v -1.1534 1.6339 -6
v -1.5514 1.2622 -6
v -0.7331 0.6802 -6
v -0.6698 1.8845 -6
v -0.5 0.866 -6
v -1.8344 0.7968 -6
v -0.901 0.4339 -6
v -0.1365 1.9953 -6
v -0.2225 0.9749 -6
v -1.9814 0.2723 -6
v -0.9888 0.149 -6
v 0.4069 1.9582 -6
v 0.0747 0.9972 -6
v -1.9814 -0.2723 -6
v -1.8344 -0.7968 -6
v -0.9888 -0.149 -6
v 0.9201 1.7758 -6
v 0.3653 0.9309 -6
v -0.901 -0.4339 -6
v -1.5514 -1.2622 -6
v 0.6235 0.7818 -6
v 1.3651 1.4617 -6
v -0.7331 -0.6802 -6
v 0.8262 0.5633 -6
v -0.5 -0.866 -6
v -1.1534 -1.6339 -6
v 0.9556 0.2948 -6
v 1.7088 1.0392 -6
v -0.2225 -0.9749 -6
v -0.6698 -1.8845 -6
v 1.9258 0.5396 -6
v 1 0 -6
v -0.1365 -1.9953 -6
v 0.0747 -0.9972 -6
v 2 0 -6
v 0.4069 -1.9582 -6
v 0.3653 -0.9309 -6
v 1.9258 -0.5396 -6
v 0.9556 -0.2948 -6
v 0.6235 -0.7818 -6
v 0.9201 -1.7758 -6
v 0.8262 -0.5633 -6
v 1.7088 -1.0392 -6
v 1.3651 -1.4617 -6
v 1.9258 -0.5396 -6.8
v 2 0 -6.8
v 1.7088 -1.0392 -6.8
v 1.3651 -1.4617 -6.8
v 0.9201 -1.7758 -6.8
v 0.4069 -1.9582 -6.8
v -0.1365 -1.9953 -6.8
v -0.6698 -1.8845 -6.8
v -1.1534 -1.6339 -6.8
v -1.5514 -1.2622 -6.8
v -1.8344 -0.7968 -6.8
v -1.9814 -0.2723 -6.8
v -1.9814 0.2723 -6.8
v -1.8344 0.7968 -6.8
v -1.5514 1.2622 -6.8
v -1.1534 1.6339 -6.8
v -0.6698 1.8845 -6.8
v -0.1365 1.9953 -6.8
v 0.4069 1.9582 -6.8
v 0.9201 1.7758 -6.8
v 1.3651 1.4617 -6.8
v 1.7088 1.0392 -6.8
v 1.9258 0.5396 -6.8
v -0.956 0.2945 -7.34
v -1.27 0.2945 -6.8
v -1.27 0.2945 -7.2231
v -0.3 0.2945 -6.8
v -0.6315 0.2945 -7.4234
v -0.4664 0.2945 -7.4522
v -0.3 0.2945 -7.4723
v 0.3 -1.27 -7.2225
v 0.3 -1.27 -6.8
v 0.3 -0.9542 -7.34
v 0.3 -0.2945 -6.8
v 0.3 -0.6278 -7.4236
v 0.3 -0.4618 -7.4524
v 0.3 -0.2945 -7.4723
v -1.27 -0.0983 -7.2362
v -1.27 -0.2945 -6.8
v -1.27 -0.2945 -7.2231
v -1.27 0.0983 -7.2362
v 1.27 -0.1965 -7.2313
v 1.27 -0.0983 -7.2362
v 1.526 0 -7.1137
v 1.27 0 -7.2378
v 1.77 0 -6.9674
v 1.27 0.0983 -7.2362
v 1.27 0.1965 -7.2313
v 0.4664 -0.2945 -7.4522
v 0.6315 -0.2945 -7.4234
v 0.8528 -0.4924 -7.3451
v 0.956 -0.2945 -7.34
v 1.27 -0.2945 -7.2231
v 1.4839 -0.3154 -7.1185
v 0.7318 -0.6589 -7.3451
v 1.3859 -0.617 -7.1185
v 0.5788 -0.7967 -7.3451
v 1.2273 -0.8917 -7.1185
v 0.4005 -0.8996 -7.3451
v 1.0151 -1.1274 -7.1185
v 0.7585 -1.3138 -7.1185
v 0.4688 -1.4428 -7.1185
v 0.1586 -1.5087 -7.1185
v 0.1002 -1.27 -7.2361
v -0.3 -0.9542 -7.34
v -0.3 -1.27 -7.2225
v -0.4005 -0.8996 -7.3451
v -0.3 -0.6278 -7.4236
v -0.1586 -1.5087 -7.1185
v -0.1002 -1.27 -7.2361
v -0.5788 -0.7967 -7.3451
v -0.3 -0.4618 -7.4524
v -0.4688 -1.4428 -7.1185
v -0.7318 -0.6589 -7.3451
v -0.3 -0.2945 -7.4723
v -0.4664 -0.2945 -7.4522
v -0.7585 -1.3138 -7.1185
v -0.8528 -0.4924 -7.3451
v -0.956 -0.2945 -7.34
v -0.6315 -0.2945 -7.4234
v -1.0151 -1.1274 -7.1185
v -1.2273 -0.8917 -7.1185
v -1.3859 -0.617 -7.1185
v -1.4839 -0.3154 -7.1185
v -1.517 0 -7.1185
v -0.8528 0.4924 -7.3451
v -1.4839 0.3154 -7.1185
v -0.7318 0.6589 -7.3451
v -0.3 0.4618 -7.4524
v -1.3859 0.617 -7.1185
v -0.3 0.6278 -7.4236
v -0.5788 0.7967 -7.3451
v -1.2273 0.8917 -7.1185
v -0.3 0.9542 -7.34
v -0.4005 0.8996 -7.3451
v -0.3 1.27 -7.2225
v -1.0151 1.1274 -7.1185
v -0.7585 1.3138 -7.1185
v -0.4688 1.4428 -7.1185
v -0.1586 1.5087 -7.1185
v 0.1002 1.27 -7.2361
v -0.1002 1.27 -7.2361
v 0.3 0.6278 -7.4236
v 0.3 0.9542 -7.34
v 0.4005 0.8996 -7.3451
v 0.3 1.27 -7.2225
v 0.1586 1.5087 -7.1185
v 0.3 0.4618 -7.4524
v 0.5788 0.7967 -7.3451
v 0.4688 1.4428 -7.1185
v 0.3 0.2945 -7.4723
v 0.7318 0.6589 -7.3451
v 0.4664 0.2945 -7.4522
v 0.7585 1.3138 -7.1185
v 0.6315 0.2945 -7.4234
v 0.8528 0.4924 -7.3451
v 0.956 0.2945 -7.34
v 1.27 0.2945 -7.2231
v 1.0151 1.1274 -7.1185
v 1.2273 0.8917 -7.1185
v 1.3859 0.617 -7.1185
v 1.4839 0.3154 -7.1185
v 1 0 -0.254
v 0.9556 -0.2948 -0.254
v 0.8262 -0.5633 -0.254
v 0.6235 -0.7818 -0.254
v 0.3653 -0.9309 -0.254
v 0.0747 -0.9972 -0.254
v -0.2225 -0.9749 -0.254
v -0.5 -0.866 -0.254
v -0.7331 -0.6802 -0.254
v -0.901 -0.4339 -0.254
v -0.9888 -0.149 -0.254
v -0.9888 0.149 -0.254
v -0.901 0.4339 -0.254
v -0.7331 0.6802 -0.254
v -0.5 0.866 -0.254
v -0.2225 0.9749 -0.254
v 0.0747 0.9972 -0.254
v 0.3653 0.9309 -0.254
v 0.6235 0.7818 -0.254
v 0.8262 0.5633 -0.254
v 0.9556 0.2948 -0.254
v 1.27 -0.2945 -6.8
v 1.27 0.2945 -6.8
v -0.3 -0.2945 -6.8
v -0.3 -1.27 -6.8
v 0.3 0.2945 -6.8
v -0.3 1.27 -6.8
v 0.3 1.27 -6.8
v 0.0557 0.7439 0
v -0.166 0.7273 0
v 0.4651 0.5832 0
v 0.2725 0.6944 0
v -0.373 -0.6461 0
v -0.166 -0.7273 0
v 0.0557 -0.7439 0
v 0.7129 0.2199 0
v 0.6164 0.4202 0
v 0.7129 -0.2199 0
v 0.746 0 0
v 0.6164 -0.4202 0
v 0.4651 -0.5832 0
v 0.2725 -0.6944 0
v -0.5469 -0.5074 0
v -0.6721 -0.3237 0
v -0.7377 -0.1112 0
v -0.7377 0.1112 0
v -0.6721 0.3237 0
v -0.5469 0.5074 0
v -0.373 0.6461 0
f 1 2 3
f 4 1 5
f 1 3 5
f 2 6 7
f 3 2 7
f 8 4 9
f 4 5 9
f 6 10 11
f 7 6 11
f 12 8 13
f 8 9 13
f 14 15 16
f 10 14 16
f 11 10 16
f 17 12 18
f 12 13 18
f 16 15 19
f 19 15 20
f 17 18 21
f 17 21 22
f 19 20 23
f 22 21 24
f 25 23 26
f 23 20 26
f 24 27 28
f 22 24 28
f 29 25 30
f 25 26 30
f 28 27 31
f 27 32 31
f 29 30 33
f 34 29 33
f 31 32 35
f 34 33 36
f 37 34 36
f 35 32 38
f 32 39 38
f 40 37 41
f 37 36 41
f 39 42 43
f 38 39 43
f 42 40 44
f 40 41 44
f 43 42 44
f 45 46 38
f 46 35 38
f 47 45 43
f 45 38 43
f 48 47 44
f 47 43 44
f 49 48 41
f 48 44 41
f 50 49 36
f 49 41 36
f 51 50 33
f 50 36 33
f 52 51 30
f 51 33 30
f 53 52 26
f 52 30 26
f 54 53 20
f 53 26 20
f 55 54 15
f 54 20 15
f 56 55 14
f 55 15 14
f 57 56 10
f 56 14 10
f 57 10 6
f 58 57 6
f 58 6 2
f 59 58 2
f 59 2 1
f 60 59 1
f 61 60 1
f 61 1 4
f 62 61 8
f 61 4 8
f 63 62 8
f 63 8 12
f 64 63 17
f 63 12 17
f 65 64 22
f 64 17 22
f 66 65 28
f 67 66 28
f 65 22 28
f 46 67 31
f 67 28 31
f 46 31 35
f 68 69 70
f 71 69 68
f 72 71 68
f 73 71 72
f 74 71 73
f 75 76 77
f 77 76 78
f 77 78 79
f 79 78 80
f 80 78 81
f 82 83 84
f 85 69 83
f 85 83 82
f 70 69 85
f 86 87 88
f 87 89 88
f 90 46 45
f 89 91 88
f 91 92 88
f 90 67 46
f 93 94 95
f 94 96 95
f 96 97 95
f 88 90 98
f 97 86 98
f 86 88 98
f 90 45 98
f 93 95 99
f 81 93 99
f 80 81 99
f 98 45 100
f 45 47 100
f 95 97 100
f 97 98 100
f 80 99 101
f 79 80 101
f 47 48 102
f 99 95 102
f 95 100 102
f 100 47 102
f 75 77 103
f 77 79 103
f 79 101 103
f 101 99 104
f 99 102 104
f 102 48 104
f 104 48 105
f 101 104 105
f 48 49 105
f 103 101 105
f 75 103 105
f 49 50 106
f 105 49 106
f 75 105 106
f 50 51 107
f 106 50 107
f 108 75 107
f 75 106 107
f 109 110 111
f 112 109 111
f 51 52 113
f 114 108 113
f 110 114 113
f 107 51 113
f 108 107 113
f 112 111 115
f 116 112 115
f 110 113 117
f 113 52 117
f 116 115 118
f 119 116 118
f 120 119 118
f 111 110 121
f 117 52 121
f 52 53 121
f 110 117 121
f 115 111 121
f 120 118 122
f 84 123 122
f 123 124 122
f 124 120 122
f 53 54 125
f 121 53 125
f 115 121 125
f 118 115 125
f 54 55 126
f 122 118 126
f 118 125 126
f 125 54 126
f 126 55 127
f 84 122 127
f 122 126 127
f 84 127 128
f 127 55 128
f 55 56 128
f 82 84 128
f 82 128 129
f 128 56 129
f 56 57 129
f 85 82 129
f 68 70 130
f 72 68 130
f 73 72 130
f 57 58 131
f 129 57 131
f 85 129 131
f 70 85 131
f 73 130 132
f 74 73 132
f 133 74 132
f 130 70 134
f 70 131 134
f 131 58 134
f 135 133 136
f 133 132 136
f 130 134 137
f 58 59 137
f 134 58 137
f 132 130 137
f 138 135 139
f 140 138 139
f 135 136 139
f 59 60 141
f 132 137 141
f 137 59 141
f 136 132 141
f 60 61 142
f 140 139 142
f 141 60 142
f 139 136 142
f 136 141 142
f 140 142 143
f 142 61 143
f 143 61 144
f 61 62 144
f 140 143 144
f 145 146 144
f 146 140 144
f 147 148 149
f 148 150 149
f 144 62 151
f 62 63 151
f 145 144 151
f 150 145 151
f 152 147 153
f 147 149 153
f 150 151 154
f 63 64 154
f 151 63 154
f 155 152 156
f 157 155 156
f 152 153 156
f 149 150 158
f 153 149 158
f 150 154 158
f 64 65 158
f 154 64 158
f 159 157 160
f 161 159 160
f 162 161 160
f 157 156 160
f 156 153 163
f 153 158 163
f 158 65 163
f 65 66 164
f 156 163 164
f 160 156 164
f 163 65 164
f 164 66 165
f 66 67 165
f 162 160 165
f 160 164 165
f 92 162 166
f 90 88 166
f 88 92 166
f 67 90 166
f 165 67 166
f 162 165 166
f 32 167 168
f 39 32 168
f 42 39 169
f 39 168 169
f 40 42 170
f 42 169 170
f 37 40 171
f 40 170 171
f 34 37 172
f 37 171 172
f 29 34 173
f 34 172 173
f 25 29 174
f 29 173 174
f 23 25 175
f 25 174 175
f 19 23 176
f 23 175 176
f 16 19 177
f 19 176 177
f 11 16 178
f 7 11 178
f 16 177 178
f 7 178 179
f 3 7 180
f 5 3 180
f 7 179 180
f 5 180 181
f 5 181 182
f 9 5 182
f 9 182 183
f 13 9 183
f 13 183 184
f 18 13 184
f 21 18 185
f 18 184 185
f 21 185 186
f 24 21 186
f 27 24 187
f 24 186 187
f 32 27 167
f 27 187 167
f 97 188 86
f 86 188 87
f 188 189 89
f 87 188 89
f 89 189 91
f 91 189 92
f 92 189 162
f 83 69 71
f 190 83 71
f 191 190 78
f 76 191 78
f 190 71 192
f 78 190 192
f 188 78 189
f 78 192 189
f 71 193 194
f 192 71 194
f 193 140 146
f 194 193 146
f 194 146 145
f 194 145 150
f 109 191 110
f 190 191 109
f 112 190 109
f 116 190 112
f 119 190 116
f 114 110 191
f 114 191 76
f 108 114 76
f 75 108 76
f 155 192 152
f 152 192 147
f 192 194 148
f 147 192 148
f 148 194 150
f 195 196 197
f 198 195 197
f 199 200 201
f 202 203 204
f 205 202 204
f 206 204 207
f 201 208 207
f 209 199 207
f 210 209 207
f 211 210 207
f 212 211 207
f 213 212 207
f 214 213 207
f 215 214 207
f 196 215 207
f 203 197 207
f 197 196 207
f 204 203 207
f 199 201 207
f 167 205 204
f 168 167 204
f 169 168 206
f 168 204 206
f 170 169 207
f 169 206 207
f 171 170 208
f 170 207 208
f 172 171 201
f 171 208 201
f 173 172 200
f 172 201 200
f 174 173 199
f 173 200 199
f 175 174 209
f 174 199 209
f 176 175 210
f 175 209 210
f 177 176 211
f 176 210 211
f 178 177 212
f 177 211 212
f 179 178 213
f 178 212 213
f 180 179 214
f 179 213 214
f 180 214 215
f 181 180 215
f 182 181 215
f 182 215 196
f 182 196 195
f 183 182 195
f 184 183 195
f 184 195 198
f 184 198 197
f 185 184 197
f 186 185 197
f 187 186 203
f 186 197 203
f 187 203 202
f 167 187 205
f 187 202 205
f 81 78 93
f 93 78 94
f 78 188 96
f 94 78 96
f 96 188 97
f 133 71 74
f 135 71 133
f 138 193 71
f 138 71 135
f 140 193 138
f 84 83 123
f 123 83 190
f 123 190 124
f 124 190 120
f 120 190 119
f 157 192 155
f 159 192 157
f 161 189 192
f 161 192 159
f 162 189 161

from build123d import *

# Parameters (mm, degrees)
SKETCH2_W      = 0.6
SKETCH2_H      = 1.518456807
EXTRUDE1_DEPTH = 1.27
SKETCH3_W      = 1.103174595
SKETCH3_H      = 0.588939024
EXTRUDE2_DEPTH = 1.27
CHAMFER1_SIZE  = 0.254


with BuildPart() as part:
    # Sketch1 → Revolve1 (revolve)
    with BuildSketch(Plane(origin=(0, 0, 0), x_dir=(1, 0, 0), z_dir=(0, 1, 0))):
        with BuildLine():
            Line((0, 0), (0, 7.5))
            ThreePointArc((0, 7.5), (1.059481005, 7.319945729), (2, 6.8))
            Line((2, 6.8), (2, 6))
            Line((2, 6), (1, 6))
            Line((1, 6), (1, 0))
            Line((1, 0), (0, 0))
        make_face()
    revolve(axis=Axis((0, 0, 0), (0, 0, -1)))

    # Sketch2 → Extrude1 (cut, symmetric)
    with BuildSketch(Plane(origin=(0, 0, 0), x_dir=(1, 0, 0), z_dir=(0, 1, 0))):
        with Locations((0, 7.559228404)):
            Rectangle(SKETCH2_W, SKETCH2_H)
    extrude(amount=EXTRUDE1_DEPTH, both=True, mode=Mode.SUBTRACT)

    # Sketch3 → Extrude2 (cut, symmetric)
    with BuildSketch(Plane(origin=(0, 0, 0), x_dir=(0, 0, -1), z_dir=(1, 0, 0))):
        with Locations((7.351587298, 0)):
            Rectangle(SKETCH3_W, SKETCH3_H)
    extrude(amount=EXTRUDE2_DEPTH, both=True, mode=Mode.SUBTRACT)

    # Chamfer1
    chamfer1_edges = [part.edges().sort_by_distance(p)[0] for p in [
        (-1, 0, 0),
    ]]
    chamfer(chamfer1_edges, length=CHAMFER1_SIZE)


solid = part.part
